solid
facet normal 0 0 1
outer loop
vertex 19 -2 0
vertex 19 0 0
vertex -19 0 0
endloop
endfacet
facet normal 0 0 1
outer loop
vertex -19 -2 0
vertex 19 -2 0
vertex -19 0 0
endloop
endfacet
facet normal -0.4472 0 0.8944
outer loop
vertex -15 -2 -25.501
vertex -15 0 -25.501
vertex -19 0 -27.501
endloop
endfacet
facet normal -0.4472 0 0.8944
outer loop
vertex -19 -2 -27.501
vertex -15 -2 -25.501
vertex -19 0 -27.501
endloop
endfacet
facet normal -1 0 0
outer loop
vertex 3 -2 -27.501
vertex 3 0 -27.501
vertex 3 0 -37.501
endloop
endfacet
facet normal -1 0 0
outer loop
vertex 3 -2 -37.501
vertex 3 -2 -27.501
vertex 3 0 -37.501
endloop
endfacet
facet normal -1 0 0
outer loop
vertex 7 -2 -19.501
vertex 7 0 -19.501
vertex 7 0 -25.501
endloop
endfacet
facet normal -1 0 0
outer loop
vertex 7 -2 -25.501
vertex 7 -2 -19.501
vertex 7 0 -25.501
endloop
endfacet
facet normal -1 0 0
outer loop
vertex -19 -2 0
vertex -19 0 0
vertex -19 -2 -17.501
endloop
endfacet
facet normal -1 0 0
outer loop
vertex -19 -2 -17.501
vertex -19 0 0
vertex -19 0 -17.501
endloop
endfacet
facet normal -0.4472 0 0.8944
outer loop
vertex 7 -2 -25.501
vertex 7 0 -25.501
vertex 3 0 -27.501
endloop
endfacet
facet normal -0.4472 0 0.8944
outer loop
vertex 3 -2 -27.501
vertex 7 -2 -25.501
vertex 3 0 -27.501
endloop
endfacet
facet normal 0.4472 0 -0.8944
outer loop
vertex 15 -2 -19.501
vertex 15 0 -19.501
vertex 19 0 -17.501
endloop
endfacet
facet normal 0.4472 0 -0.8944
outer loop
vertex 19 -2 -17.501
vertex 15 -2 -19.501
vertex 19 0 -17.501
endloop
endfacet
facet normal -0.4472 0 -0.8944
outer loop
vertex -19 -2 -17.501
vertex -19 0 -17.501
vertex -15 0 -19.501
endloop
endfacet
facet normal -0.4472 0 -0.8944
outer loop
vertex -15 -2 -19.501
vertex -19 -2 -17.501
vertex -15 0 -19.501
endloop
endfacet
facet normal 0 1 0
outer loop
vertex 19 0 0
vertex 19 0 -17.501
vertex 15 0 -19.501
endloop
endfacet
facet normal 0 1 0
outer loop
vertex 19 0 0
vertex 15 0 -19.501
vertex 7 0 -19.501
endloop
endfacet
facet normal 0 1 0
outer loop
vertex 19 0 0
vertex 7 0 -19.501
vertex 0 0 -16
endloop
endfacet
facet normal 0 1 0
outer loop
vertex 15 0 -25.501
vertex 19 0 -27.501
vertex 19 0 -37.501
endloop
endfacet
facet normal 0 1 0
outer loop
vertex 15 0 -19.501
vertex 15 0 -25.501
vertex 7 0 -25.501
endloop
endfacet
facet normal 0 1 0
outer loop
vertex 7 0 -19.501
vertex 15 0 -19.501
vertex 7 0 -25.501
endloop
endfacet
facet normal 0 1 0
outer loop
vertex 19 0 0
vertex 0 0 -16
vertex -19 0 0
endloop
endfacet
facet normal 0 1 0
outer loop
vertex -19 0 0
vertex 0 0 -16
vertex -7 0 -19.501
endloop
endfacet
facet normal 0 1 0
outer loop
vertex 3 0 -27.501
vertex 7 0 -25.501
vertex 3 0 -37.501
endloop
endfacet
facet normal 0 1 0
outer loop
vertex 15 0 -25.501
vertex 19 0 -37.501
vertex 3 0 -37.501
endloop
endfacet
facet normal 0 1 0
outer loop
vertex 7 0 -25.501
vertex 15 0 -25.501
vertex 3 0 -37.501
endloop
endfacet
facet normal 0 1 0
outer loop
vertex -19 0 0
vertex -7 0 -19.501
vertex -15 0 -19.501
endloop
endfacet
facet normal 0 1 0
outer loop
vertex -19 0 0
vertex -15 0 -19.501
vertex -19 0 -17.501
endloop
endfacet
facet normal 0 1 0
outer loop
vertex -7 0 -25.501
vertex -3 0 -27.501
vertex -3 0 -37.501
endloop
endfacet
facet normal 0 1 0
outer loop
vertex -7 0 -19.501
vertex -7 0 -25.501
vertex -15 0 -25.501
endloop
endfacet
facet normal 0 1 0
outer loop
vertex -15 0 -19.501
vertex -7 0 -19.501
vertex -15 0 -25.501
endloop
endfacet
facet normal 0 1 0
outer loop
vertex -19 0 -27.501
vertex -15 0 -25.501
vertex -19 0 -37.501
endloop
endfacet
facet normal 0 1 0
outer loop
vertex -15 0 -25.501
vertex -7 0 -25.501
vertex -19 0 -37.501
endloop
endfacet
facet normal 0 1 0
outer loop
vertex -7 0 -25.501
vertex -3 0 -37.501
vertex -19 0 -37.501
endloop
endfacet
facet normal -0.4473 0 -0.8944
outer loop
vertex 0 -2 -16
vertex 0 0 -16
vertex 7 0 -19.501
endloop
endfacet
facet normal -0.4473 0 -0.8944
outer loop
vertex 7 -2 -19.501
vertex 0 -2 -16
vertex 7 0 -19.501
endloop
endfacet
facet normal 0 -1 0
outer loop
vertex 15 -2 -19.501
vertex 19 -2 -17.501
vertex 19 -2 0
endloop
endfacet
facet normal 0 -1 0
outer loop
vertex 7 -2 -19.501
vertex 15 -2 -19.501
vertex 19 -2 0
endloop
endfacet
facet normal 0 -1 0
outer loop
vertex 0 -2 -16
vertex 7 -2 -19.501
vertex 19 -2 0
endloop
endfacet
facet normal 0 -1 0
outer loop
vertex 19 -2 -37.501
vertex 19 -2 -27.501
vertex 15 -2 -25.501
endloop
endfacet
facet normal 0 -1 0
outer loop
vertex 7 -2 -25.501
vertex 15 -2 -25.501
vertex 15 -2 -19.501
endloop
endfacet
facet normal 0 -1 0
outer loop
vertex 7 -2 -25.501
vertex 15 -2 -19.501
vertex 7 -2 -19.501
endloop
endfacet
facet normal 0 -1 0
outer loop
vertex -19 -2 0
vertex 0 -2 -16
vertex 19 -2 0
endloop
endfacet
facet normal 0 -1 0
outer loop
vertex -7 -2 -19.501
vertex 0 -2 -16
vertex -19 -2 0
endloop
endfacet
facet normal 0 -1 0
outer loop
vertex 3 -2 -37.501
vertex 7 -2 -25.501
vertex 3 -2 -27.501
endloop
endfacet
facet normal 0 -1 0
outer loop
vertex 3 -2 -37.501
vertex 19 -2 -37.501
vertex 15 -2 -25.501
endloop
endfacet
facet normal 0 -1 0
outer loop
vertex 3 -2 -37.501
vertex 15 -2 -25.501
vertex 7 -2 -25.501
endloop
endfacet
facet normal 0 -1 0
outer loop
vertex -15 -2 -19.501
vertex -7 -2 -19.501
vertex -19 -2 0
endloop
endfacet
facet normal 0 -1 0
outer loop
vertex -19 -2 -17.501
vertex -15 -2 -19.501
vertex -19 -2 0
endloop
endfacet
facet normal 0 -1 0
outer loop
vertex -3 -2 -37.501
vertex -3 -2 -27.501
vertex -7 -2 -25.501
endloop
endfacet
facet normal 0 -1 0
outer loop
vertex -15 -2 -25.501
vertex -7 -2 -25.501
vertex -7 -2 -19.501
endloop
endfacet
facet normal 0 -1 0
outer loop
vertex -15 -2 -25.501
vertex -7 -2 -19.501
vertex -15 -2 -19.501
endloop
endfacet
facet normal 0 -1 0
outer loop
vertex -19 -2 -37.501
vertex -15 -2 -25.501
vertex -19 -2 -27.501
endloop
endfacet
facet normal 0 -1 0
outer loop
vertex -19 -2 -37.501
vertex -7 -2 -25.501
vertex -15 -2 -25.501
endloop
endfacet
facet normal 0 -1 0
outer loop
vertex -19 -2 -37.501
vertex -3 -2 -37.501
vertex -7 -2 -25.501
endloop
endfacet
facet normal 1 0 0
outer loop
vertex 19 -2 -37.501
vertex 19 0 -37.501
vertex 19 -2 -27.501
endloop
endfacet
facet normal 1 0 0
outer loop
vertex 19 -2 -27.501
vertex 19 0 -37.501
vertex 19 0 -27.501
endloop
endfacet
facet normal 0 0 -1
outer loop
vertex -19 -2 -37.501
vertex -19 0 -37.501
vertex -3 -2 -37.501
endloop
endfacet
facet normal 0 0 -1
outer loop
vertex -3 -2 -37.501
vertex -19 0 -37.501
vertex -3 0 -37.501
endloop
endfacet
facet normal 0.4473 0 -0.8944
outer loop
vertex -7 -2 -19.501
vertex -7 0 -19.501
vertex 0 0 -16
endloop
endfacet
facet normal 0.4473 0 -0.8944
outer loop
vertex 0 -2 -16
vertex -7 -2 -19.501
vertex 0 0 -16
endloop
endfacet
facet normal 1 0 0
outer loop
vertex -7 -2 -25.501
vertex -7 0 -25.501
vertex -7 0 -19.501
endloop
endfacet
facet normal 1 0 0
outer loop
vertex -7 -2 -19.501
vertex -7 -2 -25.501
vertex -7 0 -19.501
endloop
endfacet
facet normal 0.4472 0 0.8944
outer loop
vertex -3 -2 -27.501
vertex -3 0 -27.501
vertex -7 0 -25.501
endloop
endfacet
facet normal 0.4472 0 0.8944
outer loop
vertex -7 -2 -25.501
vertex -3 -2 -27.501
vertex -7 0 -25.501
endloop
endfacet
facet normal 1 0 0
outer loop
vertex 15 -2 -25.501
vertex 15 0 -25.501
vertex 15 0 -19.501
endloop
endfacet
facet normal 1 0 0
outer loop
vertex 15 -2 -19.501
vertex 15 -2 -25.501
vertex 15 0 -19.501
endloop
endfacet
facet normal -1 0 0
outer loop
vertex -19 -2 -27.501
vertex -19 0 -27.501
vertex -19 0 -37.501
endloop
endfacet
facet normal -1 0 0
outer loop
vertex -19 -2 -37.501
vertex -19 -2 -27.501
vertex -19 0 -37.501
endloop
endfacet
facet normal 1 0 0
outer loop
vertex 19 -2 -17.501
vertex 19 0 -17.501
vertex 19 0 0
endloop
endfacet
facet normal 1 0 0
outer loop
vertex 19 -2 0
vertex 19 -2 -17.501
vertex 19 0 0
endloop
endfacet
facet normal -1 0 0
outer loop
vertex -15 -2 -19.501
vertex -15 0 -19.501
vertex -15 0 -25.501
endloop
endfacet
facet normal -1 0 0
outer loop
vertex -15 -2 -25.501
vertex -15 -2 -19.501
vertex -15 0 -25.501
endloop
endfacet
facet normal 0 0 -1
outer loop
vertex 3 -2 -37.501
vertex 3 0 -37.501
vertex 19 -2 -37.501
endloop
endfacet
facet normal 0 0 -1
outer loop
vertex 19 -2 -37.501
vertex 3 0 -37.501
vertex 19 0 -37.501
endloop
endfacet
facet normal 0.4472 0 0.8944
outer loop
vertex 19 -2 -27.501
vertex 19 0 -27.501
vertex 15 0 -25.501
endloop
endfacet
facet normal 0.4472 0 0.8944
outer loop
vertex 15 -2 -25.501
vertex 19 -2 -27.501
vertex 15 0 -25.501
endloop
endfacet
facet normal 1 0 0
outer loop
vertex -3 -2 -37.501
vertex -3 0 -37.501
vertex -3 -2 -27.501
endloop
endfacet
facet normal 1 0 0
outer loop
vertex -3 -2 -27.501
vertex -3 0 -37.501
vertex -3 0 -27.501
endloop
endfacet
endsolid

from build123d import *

# Parameters (mm, degrees)
FLANGE_BASE1_DEPTH = 2


# Sheet-metal steps are written as plain solids
with BuildPart() as part:
    # Esboço1 → Flange-base1 (new body)
    with BuildSketch(Plane(origin=(0, 0, 0), x_dir=(1, 0, 0), z_dir=(0, 1, 0))):
        Polygon((3, 37.500755799), (19, 37.500755799), (19, 27.500755799), (15, 25.500755799), (15, 19.500755799), (19, 17.500755799), (19, 0), (-19, 0), (-19, 17.500755799), (-15, 19.500755799), (-15, 25.500755799), (-19, 27.500755799), (-19, 37.500755799), (-3, 37.500755799), (-3, 27.500755799), (-7, 25.500755799), (-7, 19.500755799), (0, 16), (7, 19.500755799), (7, 25.500755799), (3, 27.500755799), align=None)
    extrude(amount=-FLANGE_BASE1_DEPTH)


solid = part.part
